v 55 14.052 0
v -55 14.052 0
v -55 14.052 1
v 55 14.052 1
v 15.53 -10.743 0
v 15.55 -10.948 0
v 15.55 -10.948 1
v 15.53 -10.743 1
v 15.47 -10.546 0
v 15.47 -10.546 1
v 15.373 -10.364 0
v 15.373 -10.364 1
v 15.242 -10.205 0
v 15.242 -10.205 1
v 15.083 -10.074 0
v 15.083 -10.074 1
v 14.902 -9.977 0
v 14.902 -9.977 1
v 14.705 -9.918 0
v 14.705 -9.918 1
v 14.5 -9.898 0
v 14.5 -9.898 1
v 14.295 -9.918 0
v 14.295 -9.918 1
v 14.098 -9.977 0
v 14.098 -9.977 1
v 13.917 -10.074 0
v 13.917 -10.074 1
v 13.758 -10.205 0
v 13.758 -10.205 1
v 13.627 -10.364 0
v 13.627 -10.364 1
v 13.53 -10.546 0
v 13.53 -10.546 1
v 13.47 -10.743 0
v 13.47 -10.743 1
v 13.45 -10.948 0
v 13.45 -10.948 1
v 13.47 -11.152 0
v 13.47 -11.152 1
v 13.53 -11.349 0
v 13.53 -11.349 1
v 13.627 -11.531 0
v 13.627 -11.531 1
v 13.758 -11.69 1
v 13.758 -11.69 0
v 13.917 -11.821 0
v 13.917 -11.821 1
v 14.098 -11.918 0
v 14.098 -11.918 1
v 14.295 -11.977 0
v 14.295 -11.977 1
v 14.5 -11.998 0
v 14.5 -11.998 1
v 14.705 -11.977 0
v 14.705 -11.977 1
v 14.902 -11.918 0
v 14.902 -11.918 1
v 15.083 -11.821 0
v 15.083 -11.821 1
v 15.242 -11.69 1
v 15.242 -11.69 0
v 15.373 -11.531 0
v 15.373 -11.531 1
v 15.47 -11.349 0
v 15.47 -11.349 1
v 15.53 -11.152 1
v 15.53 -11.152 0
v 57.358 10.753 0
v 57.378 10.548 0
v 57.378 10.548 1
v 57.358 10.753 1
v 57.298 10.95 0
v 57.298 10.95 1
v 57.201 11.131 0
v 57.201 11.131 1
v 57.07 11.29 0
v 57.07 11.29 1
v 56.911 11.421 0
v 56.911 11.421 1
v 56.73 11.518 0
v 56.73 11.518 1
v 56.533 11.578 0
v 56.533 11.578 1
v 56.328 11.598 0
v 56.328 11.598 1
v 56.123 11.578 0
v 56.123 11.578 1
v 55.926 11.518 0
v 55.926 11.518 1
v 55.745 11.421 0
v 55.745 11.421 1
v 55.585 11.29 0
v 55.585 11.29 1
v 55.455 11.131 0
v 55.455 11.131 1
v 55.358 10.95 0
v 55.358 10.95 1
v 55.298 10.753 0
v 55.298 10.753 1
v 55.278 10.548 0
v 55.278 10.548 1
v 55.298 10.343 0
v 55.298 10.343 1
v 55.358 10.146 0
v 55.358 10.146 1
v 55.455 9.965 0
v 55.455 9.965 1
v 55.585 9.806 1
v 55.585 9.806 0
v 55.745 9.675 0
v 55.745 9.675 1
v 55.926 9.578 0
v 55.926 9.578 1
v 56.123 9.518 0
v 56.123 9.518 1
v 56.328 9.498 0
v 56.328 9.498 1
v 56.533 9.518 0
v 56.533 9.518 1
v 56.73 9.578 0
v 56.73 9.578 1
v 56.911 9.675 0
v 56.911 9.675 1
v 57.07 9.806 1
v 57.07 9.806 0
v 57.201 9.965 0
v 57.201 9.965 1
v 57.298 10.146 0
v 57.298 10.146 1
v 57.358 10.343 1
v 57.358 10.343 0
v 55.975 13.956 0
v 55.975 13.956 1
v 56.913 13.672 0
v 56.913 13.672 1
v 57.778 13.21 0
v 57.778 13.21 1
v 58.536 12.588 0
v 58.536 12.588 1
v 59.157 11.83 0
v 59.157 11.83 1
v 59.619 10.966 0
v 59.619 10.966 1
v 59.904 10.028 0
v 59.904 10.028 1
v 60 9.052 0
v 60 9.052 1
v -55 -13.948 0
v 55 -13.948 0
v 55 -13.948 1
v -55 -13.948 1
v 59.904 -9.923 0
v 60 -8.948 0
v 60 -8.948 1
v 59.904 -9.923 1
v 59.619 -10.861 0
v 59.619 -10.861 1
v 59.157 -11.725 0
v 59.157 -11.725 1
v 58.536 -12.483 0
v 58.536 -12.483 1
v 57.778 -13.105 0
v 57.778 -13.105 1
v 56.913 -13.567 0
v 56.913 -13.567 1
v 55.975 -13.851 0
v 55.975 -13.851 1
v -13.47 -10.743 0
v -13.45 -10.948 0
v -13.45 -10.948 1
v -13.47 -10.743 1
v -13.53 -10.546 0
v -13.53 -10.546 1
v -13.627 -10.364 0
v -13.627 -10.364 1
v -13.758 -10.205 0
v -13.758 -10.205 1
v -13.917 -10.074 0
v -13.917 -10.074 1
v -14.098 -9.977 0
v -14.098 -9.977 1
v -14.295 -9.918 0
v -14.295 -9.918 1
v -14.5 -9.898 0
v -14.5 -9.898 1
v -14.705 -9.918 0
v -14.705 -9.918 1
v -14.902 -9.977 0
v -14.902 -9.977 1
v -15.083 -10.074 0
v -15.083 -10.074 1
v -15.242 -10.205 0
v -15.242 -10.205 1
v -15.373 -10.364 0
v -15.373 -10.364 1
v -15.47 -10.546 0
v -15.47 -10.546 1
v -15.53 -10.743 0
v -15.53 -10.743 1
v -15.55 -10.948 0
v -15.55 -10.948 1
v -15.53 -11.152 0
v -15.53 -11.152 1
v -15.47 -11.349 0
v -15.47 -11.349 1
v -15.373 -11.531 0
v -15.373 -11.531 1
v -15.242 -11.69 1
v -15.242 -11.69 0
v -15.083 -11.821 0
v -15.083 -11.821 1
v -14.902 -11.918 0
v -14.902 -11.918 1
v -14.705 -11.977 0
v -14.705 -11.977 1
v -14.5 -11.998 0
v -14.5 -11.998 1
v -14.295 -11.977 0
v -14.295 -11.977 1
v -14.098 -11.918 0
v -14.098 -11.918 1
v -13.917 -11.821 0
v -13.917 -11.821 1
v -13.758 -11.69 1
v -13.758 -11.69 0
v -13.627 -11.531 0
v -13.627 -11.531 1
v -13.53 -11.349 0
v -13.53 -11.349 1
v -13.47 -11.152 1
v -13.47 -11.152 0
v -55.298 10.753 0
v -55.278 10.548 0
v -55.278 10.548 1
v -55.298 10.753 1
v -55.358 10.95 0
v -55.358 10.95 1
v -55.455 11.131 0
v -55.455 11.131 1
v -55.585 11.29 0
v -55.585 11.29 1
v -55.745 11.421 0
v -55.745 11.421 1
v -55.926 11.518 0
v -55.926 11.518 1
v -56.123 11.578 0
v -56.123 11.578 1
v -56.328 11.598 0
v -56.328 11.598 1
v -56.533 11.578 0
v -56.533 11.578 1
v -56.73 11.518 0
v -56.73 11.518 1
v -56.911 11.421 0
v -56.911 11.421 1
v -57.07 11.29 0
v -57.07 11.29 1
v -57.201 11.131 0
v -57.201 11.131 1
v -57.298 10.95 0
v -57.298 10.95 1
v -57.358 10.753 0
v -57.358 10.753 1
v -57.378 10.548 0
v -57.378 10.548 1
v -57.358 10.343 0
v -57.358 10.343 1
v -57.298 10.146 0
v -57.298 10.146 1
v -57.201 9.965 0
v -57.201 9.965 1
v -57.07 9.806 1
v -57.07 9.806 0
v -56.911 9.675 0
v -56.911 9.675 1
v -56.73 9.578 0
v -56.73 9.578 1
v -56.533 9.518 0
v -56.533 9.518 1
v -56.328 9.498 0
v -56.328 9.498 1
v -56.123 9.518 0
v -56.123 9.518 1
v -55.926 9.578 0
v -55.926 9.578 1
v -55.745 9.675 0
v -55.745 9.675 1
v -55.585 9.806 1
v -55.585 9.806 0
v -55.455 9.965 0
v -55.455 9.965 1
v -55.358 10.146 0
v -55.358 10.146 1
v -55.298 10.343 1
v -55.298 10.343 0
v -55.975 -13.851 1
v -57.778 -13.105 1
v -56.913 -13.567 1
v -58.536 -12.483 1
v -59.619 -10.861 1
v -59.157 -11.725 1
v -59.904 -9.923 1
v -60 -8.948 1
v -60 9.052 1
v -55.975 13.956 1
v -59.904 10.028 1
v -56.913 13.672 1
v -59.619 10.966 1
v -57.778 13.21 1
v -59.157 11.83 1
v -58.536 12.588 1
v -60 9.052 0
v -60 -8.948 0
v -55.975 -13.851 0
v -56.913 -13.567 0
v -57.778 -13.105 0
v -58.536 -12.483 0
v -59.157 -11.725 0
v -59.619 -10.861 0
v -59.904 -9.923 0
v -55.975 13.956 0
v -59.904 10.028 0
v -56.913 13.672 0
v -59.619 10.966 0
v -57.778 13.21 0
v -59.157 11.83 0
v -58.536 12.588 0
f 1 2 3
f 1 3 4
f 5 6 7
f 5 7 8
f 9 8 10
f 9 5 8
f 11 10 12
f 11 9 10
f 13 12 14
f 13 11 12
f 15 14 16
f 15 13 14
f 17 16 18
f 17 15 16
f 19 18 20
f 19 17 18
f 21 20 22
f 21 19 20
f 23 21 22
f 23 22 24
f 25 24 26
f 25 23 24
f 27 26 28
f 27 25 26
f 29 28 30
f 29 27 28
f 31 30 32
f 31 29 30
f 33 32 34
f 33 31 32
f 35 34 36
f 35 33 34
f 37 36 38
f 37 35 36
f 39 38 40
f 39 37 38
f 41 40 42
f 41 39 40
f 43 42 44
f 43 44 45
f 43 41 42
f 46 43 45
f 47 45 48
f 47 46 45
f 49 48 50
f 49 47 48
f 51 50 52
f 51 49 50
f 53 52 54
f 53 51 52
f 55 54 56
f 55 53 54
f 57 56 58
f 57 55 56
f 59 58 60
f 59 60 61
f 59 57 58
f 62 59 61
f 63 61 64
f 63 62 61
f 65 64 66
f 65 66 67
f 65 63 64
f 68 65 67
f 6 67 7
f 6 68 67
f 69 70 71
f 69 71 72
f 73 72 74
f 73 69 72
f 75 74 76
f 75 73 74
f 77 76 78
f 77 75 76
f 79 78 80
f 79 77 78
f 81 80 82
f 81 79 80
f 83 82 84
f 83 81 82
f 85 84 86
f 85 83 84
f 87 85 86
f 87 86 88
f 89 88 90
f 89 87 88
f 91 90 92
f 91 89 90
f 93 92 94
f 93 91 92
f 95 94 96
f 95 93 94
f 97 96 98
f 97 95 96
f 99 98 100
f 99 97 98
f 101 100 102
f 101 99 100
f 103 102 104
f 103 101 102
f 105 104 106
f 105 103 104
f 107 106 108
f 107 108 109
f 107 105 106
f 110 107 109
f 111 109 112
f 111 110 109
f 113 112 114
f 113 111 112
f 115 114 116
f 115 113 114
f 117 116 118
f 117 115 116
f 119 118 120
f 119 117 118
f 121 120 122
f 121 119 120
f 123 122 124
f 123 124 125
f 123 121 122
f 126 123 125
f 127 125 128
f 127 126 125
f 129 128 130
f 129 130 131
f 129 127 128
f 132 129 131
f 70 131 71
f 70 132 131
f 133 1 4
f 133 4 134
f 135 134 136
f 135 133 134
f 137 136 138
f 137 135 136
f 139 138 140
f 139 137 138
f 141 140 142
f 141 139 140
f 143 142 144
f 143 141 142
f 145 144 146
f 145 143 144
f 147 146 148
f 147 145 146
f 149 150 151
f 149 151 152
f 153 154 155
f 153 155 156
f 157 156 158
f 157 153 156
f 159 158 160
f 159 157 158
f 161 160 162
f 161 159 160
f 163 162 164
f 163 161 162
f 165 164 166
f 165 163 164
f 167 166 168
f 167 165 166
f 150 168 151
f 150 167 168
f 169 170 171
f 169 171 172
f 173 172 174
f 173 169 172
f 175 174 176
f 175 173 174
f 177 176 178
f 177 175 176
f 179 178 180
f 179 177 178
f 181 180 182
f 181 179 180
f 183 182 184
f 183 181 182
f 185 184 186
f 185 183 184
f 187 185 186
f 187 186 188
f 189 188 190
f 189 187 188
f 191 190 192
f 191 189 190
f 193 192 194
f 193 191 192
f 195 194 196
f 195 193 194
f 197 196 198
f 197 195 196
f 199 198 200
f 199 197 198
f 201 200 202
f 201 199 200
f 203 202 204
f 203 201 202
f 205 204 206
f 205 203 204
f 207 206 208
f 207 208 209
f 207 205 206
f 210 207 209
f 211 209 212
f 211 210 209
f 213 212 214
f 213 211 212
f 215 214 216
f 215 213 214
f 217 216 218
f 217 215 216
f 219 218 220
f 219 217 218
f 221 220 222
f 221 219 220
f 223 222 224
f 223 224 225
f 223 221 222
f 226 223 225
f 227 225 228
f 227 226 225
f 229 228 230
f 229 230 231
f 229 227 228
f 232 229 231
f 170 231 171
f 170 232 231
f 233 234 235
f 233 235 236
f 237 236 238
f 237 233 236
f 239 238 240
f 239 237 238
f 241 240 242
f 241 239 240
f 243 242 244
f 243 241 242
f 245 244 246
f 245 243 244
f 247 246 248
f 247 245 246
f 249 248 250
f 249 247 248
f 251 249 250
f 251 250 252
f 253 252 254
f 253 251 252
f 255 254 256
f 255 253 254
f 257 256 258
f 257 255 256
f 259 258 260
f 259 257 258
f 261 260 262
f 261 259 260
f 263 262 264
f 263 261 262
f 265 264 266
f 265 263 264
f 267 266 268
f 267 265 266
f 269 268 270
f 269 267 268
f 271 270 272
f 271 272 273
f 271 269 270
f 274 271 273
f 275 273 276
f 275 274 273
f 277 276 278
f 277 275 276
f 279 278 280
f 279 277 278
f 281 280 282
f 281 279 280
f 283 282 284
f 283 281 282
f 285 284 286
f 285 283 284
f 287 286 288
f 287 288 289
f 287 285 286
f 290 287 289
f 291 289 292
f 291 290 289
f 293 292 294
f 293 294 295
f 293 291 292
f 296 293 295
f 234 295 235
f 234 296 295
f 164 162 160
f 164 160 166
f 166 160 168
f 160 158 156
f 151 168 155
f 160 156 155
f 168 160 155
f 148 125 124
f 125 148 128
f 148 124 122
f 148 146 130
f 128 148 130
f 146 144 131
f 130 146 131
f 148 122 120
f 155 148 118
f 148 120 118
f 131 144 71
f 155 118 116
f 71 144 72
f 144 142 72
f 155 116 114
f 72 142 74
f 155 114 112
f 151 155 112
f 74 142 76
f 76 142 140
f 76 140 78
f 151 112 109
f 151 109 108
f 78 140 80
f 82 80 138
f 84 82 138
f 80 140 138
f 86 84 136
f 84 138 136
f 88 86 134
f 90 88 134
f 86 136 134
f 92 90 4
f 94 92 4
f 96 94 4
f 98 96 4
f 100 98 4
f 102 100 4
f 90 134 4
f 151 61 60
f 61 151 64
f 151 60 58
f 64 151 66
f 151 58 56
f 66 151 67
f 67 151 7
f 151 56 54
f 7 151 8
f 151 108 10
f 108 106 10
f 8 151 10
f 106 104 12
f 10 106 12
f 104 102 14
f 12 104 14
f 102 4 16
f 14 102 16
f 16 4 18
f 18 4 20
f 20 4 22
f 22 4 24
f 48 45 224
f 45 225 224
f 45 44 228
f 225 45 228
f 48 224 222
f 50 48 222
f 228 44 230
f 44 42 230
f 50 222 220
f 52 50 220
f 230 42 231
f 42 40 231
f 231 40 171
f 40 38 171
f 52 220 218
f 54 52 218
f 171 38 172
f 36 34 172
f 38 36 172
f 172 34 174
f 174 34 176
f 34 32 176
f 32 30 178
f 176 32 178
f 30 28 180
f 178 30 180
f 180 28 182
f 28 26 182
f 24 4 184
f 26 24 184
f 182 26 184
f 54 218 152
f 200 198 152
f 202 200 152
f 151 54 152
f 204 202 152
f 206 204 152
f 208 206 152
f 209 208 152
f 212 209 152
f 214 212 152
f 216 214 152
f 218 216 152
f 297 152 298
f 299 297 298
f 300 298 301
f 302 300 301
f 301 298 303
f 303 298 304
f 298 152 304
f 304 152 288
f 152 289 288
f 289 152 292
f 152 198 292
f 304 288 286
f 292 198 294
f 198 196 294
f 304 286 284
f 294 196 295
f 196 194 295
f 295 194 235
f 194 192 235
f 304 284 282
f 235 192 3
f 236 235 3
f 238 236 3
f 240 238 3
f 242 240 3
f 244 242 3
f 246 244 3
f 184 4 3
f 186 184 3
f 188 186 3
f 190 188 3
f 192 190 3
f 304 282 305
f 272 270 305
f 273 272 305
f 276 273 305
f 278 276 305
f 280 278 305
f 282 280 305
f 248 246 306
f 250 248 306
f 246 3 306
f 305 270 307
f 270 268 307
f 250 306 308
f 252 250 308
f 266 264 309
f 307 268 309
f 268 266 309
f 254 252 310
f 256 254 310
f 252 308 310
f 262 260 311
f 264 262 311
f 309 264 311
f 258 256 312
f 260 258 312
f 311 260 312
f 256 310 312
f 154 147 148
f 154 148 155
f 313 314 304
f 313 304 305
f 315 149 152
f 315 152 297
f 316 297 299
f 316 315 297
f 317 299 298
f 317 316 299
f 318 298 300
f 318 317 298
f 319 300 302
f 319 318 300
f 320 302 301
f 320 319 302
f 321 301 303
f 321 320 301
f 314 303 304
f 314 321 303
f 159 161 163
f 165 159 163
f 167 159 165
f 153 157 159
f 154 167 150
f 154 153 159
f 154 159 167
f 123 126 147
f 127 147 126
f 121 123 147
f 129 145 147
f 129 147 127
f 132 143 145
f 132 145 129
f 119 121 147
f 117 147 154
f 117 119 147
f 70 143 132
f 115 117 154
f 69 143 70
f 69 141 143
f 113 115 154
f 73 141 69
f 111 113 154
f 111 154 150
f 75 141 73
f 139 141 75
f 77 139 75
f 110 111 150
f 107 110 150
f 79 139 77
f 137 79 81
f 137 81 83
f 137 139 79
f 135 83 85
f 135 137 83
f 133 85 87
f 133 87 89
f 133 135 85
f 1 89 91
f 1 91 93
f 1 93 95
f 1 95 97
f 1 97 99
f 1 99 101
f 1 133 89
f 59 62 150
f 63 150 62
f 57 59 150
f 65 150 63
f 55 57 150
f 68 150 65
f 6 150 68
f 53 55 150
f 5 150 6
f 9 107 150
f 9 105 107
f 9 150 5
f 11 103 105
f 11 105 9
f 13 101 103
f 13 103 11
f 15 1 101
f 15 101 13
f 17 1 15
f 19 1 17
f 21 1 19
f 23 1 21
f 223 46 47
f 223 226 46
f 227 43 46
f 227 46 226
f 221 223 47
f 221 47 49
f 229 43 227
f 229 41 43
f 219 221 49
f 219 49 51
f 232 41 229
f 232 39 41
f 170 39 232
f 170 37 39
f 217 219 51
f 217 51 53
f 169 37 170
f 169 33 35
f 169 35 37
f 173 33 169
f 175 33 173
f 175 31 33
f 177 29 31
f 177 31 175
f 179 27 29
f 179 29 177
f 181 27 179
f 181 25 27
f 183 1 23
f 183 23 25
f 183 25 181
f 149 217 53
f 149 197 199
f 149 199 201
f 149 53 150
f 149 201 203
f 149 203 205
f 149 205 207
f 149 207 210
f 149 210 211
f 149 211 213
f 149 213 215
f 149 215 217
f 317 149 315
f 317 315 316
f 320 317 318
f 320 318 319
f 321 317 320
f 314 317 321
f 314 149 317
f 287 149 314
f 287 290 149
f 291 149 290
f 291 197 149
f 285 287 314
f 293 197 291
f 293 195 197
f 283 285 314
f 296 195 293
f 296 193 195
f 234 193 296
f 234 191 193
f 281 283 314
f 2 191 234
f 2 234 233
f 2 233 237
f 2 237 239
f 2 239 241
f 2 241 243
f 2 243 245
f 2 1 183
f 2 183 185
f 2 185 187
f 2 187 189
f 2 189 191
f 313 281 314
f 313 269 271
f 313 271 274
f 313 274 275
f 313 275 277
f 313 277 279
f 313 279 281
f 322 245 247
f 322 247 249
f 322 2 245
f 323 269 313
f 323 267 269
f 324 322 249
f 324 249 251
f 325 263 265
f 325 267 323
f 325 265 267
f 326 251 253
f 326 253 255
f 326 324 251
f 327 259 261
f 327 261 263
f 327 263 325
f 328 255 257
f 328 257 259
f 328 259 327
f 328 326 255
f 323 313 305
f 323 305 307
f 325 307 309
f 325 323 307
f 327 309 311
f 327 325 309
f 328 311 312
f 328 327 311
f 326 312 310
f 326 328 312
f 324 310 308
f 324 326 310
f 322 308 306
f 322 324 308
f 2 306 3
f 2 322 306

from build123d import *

# Parameters (mm, degrees)
SKETCH3_R           = 1.05
BOSS_EXTRUDE1_DEPTH = 1


with BuildPart() as part:
    # Sketch3 → Boss-Extrude1 (new body)
    with BuildSketch(Plane.XY):
        with BuildLine():
            Line((0, 14.052488348), (55, 14.052488348))
            ThreePointArc((55, 14.052488348), (58.535533906, 12.588022254), (60, 9.052488348))
            Line((60, 9.052488348), (60, -8.947511652))
            ThreePointArc((60, -8.947511652), (58.535533906, -12.483045558), (55, -13.947511652))
            Line((55, -13.947511652), (0, -13.947511652))
            Line((0, -13.947511652), (-55, -13.947511652))
            ThreePointArc((-55, -13.947511652), (-58.535533906, -12.483045558), (-60, -8.947511652))
            Line((-60, -8.947511652), (-60, 9.052488348))
            ThreePointArc((-60, 9.052488348), (-58.535533906, 12.588022254), (-55, 14.052488348))
            Line((-55, 14.052488348), (0, 14.052488348))
        make_face()
        with Locations((-56.327907587, 10.548035553)):
            Circle(SKETCH3_R, mode=Mode.SUBTRACT)
        with Locations((56.327907587, 10.548035553)):
            Circle(SKETCH3_R, mode=Mode.SUBTRACT)
        with Locations((-14.5, -10.947511652)):
            Circle(SKETCH3_R, mode=Mode.SUBTRACT)
        with Locations((14.5, -10.947511652)):
            Circle(SKETCH3_R, mode=Mode.SUBTRACT)
    extrude(amount=BOSS_EXTRUDE1_DEPTH)


solid = part.part
